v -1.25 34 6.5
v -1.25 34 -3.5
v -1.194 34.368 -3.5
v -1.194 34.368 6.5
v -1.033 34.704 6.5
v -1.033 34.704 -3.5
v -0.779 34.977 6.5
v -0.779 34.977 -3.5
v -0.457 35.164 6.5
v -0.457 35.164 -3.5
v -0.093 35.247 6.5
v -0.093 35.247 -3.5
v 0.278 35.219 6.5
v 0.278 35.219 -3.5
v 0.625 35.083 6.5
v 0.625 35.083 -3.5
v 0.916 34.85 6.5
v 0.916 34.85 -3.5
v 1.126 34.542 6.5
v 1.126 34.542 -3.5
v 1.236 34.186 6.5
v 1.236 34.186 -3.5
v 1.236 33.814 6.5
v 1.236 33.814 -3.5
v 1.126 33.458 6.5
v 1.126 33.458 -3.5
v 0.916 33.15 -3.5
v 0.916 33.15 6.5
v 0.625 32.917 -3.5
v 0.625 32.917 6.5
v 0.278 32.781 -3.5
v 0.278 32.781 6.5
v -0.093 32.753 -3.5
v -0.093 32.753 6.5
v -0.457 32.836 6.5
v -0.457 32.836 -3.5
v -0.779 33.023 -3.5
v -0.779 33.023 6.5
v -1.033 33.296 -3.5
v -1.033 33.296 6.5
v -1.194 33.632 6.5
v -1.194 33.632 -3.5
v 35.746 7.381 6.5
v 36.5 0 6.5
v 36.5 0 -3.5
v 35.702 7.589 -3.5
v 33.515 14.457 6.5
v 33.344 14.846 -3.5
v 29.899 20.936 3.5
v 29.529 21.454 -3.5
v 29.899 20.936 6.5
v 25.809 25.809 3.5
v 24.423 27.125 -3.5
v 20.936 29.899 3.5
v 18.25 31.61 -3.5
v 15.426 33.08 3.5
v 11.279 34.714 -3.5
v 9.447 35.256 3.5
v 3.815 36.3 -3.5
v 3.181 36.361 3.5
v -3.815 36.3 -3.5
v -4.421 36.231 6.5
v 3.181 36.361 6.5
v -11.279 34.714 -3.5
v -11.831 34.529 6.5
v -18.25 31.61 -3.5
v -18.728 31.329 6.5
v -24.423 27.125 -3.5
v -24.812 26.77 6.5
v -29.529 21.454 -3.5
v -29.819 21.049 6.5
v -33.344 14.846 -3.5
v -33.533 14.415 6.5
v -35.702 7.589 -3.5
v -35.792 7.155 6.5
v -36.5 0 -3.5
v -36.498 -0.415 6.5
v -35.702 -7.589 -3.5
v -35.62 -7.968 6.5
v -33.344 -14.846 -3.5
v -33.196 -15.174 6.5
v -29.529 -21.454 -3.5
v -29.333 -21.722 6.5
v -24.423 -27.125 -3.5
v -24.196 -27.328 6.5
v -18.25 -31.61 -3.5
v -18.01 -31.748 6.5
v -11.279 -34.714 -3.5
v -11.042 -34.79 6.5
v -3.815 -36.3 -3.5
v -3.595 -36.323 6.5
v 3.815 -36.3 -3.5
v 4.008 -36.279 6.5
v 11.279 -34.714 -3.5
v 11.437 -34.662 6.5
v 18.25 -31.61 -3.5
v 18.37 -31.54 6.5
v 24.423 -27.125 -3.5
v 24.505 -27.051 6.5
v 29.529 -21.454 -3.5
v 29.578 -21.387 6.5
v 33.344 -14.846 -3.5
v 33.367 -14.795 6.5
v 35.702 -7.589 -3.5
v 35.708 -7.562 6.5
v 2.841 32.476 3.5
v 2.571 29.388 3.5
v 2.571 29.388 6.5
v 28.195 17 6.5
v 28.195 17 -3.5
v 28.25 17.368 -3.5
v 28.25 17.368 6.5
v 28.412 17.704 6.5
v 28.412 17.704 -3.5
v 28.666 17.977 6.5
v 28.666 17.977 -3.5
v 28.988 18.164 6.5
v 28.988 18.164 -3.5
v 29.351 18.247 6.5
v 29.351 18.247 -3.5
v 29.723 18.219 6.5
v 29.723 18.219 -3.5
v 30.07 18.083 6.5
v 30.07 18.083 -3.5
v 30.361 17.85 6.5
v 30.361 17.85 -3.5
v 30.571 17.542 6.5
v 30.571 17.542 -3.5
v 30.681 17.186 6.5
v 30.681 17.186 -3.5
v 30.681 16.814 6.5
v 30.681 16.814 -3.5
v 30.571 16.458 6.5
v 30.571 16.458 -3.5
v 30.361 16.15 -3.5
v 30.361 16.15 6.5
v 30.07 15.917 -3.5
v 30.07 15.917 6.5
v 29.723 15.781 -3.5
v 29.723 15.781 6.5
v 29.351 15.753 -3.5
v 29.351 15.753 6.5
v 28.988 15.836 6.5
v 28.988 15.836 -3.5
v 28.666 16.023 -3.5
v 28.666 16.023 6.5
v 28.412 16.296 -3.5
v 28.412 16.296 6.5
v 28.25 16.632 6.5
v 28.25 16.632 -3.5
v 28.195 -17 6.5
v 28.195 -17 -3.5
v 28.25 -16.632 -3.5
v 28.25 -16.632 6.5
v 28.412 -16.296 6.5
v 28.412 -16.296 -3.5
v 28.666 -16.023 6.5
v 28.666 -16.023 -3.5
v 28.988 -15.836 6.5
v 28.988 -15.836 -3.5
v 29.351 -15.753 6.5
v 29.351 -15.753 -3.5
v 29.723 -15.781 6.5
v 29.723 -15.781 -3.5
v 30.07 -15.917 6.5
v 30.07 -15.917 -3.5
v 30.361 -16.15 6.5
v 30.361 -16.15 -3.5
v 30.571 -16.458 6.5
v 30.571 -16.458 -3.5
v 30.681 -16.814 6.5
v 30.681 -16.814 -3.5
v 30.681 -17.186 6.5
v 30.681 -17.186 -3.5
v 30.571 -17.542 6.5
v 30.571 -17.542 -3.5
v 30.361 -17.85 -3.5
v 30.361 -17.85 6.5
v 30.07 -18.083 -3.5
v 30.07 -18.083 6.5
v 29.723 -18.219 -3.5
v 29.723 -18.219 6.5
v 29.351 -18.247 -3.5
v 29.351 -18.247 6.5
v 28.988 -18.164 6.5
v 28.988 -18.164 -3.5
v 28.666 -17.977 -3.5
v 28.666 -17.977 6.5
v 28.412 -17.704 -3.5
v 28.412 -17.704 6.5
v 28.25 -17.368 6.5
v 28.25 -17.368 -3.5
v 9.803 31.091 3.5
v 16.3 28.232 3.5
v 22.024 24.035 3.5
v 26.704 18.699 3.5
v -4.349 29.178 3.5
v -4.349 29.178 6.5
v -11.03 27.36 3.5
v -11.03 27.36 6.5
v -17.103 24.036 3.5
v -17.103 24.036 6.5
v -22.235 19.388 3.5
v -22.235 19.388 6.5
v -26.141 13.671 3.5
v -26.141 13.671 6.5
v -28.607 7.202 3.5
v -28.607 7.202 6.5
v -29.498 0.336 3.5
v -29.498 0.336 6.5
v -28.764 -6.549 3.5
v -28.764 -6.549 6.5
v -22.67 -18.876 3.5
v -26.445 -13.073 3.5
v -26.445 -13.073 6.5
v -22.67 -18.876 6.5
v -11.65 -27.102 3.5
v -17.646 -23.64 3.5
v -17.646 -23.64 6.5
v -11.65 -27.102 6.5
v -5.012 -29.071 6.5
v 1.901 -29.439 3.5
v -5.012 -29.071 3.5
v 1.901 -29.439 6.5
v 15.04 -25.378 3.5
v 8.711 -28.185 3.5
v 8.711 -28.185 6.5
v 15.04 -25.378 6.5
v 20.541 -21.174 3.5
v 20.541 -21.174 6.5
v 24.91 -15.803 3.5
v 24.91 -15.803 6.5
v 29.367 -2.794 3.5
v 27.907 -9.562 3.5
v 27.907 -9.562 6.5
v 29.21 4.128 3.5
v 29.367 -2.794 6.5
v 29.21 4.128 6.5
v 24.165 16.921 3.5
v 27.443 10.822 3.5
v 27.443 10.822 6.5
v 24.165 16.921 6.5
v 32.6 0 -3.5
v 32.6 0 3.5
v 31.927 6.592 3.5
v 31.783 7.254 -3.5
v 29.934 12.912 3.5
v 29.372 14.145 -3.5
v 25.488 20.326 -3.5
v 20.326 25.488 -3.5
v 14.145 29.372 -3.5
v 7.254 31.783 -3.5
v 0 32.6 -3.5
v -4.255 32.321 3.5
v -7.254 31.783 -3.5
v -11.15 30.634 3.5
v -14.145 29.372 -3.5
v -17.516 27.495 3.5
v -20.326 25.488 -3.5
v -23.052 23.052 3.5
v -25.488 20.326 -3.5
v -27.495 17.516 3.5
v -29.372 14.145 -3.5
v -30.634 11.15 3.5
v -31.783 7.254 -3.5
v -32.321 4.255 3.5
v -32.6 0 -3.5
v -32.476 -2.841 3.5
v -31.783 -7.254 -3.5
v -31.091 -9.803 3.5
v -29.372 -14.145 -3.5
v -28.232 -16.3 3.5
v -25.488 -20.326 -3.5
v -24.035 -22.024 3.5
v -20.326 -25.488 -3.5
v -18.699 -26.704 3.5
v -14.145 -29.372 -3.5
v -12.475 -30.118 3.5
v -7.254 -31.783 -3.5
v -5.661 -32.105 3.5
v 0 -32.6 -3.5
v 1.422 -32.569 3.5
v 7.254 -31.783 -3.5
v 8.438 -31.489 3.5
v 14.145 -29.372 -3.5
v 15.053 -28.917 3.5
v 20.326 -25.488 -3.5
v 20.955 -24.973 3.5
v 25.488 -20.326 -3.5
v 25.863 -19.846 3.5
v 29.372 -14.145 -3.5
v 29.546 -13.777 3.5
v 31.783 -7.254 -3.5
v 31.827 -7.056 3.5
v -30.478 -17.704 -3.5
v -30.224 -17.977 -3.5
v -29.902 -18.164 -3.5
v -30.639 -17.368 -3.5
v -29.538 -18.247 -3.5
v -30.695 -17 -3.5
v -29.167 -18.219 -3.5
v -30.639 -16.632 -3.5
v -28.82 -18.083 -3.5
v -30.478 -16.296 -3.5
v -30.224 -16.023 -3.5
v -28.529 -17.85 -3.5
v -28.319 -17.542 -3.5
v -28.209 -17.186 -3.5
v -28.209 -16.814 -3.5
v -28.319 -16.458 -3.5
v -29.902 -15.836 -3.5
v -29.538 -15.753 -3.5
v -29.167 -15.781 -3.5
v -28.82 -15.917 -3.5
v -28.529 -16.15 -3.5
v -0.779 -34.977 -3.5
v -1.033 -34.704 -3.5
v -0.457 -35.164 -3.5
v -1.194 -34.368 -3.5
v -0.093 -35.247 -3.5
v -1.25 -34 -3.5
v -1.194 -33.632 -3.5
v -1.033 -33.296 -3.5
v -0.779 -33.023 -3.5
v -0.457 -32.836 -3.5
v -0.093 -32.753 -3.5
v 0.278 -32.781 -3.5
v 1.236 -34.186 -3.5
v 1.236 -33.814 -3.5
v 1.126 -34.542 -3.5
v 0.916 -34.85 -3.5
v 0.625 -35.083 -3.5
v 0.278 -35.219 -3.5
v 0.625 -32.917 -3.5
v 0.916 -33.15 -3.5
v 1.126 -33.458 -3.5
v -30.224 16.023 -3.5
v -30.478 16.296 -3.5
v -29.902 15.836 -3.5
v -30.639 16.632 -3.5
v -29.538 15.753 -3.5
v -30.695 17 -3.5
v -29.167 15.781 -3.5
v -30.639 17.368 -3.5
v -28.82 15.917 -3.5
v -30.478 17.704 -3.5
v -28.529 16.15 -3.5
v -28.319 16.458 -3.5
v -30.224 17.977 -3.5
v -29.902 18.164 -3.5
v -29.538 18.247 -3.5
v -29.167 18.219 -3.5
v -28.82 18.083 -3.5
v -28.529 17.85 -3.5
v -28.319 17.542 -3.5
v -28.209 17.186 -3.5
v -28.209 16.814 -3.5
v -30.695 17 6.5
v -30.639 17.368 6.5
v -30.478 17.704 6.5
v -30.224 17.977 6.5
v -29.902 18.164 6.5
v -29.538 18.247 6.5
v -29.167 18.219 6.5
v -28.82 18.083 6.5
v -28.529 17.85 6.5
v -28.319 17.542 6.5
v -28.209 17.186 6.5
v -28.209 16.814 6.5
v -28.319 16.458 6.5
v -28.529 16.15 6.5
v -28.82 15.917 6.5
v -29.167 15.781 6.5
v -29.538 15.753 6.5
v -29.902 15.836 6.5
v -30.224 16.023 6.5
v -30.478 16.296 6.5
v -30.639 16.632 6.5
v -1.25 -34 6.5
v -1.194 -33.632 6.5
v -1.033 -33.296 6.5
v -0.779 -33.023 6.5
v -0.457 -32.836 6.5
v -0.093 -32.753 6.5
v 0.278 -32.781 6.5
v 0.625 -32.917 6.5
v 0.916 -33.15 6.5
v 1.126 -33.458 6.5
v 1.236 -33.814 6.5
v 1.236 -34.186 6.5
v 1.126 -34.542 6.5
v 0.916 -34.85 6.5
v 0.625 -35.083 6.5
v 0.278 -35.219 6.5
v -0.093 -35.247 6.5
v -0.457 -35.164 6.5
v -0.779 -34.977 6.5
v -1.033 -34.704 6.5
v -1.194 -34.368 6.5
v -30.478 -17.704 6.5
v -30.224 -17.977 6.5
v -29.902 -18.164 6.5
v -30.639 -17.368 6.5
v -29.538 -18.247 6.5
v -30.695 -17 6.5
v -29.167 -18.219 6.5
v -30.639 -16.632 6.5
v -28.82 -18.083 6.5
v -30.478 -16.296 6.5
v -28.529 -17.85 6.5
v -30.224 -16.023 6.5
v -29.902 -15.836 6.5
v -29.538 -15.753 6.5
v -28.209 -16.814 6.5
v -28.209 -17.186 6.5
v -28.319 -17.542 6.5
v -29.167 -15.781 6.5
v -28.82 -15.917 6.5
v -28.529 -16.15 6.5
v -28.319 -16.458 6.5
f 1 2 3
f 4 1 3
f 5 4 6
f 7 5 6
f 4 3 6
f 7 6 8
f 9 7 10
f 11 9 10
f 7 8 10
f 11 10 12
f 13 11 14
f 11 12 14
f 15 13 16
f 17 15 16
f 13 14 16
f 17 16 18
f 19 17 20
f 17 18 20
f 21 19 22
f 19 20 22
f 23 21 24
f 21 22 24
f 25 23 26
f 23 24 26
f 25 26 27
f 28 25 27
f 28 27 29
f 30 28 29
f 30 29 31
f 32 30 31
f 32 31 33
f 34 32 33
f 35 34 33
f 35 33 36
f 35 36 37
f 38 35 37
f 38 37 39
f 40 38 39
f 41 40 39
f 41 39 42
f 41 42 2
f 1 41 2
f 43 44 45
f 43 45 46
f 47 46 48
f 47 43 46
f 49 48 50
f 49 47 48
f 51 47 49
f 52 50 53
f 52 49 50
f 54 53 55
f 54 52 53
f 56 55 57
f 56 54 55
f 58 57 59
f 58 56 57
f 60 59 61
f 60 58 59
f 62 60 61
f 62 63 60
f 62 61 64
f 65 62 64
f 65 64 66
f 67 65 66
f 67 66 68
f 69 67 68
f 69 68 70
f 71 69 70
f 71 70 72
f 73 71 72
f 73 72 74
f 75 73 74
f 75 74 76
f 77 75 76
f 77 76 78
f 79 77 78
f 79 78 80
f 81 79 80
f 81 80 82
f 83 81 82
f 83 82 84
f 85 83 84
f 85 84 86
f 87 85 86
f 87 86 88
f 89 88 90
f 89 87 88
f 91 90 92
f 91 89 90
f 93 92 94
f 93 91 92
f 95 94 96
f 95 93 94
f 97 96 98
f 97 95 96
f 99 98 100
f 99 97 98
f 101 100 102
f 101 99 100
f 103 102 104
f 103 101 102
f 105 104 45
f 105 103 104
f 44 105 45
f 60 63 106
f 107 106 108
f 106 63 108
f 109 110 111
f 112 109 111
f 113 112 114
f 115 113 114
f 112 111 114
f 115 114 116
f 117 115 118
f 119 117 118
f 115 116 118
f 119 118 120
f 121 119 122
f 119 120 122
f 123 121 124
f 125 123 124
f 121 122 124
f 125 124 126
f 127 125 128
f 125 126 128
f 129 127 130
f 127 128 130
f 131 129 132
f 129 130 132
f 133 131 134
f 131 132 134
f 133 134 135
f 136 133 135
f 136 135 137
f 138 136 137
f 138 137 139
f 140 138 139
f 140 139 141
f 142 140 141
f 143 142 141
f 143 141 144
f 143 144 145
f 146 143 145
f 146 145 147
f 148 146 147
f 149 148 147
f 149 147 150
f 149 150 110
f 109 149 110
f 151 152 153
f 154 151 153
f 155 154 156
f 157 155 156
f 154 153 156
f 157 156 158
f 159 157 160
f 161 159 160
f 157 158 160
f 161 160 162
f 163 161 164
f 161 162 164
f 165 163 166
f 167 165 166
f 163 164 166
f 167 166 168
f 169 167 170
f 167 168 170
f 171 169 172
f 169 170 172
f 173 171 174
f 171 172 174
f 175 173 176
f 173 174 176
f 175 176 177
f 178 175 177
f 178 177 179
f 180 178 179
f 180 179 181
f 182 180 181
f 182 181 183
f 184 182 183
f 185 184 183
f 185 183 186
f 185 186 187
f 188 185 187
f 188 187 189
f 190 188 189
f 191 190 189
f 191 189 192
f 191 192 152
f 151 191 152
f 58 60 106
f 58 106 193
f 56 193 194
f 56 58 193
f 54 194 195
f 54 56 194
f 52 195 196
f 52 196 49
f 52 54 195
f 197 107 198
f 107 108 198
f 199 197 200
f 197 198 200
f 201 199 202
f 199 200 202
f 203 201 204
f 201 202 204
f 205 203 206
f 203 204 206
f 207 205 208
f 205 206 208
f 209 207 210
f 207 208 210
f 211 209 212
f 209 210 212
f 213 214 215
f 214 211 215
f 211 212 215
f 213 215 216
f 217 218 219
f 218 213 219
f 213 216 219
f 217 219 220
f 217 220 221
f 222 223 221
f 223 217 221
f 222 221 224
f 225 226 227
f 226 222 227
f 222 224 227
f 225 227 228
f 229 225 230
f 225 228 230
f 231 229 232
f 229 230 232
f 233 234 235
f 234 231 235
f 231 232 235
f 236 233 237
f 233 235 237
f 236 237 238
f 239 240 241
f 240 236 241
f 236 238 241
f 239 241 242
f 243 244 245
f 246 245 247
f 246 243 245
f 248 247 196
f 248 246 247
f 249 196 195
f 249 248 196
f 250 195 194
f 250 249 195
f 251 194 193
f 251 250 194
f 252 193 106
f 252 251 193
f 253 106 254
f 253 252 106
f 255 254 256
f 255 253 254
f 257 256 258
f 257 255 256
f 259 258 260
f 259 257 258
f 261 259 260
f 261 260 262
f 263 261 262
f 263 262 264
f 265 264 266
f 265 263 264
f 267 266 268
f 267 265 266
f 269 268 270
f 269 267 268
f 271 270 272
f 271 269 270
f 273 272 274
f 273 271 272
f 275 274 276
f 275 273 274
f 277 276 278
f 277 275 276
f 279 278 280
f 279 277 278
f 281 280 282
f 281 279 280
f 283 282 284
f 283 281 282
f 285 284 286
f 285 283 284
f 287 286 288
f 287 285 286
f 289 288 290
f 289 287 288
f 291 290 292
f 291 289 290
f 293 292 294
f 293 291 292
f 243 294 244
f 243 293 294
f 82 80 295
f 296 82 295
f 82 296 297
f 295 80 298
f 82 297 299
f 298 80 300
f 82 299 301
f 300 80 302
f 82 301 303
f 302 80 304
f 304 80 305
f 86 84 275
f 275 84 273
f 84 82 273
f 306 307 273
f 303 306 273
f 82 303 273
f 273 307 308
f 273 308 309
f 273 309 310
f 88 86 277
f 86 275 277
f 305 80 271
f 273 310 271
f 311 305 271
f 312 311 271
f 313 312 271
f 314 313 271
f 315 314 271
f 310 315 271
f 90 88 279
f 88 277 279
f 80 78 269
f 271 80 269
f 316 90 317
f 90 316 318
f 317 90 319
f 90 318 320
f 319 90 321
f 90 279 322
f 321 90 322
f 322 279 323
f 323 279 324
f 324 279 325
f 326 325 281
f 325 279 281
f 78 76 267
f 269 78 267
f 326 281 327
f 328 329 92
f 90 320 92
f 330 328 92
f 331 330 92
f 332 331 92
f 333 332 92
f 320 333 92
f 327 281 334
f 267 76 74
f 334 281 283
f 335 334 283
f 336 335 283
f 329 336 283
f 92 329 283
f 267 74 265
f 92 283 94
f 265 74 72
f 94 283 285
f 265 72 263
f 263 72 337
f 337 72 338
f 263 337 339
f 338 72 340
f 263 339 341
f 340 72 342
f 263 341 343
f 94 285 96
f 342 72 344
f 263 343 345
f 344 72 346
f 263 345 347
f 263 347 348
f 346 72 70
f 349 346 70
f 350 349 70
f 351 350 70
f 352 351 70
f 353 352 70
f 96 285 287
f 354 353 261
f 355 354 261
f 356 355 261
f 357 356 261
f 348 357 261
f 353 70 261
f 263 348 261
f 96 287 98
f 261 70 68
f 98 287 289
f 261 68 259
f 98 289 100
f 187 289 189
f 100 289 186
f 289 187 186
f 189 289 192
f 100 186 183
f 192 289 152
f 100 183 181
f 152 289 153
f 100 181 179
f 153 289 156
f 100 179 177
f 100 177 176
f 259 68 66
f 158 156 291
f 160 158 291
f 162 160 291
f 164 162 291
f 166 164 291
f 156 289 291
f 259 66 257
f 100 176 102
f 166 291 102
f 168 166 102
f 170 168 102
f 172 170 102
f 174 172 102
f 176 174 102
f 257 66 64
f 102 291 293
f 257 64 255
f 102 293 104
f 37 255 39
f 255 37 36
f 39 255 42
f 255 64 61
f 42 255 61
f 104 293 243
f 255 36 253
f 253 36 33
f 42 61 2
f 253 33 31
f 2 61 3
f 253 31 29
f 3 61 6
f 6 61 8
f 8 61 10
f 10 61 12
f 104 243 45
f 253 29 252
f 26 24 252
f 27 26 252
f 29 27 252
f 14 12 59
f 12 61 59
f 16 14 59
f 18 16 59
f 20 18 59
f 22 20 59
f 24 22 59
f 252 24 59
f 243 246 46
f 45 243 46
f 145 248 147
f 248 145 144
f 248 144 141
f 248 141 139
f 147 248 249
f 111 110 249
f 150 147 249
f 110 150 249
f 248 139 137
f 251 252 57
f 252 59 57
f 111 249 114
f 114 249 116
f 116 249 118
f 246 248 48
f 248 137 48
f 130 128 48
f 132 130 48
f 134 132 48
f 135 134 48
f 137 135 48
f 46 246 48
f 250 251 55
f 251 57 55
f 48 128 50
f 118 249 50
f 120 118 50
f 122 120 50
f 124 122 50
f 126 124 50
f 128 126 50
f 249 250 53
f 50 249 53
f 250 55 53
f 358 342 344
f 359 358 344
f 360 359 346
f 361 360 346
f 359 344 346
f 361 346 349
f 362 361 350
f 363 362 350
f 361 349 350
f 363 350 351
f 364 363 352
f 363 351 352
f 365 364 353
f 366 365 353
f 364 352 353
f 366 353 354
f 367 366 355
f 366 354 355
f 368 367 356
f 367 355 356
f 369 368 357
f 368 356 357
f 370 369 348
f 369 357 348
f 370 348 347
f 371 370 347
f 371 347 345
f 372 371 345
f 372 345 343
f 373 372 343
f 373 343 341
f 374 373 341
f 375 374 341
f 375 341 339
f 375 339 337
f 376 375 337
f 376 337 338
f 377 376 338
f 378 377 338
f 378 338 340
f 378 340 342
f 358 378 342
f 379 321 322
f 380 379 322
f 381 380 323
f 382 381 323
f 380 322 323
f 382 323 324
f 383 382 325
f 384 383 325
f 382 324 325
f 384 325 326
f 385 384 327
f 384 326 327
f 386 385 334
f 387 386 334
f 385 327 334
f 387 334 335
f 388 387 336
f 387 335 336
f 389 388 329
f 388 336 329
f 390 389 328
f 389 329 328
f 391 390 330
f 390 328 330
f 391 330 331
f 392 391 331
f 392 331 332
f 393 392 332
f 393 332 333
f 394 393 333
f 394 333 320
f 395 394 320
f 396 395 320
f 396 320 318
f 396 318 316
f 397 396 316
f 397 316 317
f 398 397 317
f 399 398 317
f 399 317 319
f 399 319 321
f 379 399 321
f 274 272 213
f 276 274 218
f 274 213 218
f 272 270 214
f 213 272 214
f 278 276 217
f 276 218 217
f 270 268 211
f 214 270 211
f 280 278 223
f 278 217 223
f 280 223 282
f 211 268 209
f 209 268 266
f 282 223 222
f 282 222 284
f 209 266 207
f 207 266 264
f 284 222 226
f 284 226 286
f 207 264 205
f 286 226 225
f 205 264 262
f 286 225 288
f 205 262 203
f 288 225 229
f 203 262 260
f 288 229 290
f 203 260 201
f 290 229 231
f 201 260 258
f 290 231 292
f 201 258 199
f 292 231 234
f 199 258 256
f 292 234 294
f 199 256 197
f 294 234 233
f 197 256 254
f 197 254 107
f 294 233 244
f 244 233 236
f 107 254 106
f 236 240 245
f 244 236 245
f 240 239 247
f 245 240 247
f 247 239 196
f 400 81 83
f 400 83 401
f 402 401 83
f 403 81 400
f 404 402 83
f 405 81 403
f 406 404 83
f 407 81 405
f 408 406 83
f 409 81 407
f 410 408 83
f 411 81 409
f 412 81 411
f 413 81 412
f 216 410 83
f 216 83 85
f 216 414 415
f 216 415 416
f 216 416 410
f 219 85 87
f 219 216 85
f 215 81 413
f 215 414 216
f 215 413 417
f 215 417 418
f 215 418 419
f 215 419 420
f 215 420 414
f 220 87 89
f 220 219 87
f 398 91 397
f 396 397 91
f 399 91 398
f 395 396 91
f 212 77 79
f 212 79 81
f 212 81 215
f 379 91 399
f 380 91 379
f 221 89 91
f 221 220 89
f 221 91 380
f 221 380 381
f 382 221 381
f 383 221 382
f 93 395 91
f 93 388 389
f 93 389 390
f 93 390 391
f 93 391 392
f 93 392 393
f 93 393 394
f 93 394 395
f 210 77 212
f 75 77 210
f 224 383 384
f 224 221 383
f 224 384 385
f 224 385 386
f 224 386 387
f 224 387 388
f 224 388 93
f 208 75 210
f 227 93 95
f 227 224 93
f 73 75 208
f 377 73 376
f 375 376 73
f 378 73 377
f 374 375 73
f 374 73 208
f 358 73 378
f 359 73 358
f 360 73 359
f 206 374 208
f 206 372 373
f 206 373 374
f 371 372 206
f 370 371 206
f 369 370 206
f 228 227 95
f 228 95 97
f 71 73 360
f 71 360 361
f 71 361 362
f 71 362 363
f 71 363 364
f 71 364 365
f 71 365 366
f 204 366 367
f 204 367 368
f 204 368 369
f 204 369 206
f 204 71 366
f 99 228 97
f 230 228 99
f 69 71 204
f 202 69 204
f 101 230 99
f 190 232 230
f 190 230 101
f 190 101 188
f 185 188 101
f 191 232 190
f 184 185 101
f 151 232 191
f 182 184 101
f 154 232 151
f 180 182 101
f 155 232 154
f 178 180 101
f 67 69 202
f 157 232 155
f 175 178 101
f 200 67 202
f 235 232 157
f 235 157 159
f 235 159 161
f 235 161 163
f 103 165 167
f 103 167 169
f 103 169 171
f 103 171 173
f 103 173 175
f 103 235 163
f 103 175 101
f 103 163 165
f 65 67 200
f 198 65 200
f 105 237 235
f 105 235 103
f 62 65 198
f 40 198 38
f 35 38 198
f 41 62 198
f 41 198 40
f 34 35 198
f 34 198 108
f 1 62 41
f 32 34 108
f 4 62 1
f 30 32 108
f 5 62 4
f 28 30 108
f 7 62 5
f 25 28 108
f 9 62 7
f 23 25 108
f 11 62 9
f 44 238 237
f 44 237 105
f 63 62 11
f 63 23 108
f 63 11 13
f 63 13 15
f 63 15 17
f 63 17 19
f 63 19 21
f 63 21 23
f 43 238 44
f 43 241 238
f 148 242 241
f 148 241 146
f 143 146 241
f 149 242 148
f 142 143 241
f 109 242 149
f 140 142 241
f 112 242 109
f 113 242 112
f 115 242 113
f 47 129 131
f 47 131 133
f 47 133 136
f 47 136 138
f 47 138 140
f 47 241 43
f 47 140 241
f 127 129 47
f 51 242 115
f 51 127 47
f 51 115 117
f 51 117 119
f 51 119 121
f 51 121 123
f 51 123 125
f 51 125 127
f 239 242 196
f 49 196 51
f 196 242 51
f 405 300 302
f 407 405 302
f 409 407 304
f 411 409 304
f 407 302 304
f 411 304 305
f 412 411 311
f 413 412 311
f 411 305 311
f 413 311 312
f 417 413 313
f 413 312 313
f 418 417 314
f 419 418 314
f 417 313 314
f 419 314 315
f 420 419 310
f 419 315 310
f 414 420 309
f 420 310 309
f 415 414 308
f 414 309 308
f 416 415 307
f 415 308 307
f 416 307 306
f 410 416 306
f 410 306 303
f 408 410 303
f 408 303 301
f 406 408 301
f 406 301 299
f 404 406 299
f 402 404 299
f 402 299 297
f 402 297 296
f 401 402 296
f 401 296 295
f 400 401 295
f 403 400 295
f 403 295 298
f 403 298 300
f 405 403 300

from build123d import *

# Parameters (mm, degrees)
SKETCH_1_R          = 36.5
SKETCH_1_R_2        = 32.6
EXTRUDE_1_DEPTH     = 3.5
EXTRUDE_START       = 3
SKETCH_2_R          = 36.5
SKETCH_2_R_2        = 29.5
EXTRUDE_2_DEPTH     = 3
SKETCH_3_R          = 1.25
CUT_EXTRUDE_1_DEPTH = 20
CUT_EXTRUDE_2_DEPTH = 3


with BuildPart() as part:
    # 草图1 → 凸台-拉伸1 (new, symmetric)
    with BuildSketch(Plane.XY):
        Circle(SKETCH_1_R)
        Circle(SKETCH_1_R_2, mode=Mode.SUBTRACT)
    extrude(amount=EXTRUDE_1_DEPTH, both=True)

    # 草图2 → 凸台-拉伸2 (add)
    with BuildSketch(Plane.XY.offset(3.5).offset(EXTRUDE_START)):
        Circle(SKETCH_2_R)
        Circle(SKETCH_2_R_2, mode=Mode.SUBTRACT)
    extrude(amount=-EXTRUDE_2_DEPTH)

    # 草图3 → 切除-拉伸1 (cut)
    with BuildSketch(Plane(origin=(0, 0, -3.5), x_dir=(-1, 0, 0), z_dir=(0, 0, -1))):
        with Locations((0, 34)):
            Circle(SKETCH_3_R)
        with Locations((29.444863729, 17)):
            Circle(SKETCH_3_R)
        with Locations((29.444863729, -17)):
            Circle(SKETCH_3_R)
        with Locations((0, -34)):
            Circle(SKETCH_3_R)
        with Locations((-29.444863729, -17)):
            Circle(SKETCH_3_R)
        with Locations((-29.444863729, 17)):
            Circle(SKETCH_3_R)
    extrude(amount=-CUT_EXTRUDE_1_DEPTH, mode=Mode.SUBTRACT)

    # 草图4 → 切除-拉伸2 (cut)
    with BuildSketch(Plane.XY.offset(6.5)):
        Polygon((19.356134005, 221.241624062), (3.18118461, 36.36110648), (0, 0), (29.899049617, 20.935539927), (181.922799809, 127.383715799), (367.509530933, 448.829363315), (204.942865129, 542.687271578), align=None)
    extrude(amount=-CUT_EXTRUDE_2_DEPTH, mode=Mode.SUBTRACT)


solid = part.part
